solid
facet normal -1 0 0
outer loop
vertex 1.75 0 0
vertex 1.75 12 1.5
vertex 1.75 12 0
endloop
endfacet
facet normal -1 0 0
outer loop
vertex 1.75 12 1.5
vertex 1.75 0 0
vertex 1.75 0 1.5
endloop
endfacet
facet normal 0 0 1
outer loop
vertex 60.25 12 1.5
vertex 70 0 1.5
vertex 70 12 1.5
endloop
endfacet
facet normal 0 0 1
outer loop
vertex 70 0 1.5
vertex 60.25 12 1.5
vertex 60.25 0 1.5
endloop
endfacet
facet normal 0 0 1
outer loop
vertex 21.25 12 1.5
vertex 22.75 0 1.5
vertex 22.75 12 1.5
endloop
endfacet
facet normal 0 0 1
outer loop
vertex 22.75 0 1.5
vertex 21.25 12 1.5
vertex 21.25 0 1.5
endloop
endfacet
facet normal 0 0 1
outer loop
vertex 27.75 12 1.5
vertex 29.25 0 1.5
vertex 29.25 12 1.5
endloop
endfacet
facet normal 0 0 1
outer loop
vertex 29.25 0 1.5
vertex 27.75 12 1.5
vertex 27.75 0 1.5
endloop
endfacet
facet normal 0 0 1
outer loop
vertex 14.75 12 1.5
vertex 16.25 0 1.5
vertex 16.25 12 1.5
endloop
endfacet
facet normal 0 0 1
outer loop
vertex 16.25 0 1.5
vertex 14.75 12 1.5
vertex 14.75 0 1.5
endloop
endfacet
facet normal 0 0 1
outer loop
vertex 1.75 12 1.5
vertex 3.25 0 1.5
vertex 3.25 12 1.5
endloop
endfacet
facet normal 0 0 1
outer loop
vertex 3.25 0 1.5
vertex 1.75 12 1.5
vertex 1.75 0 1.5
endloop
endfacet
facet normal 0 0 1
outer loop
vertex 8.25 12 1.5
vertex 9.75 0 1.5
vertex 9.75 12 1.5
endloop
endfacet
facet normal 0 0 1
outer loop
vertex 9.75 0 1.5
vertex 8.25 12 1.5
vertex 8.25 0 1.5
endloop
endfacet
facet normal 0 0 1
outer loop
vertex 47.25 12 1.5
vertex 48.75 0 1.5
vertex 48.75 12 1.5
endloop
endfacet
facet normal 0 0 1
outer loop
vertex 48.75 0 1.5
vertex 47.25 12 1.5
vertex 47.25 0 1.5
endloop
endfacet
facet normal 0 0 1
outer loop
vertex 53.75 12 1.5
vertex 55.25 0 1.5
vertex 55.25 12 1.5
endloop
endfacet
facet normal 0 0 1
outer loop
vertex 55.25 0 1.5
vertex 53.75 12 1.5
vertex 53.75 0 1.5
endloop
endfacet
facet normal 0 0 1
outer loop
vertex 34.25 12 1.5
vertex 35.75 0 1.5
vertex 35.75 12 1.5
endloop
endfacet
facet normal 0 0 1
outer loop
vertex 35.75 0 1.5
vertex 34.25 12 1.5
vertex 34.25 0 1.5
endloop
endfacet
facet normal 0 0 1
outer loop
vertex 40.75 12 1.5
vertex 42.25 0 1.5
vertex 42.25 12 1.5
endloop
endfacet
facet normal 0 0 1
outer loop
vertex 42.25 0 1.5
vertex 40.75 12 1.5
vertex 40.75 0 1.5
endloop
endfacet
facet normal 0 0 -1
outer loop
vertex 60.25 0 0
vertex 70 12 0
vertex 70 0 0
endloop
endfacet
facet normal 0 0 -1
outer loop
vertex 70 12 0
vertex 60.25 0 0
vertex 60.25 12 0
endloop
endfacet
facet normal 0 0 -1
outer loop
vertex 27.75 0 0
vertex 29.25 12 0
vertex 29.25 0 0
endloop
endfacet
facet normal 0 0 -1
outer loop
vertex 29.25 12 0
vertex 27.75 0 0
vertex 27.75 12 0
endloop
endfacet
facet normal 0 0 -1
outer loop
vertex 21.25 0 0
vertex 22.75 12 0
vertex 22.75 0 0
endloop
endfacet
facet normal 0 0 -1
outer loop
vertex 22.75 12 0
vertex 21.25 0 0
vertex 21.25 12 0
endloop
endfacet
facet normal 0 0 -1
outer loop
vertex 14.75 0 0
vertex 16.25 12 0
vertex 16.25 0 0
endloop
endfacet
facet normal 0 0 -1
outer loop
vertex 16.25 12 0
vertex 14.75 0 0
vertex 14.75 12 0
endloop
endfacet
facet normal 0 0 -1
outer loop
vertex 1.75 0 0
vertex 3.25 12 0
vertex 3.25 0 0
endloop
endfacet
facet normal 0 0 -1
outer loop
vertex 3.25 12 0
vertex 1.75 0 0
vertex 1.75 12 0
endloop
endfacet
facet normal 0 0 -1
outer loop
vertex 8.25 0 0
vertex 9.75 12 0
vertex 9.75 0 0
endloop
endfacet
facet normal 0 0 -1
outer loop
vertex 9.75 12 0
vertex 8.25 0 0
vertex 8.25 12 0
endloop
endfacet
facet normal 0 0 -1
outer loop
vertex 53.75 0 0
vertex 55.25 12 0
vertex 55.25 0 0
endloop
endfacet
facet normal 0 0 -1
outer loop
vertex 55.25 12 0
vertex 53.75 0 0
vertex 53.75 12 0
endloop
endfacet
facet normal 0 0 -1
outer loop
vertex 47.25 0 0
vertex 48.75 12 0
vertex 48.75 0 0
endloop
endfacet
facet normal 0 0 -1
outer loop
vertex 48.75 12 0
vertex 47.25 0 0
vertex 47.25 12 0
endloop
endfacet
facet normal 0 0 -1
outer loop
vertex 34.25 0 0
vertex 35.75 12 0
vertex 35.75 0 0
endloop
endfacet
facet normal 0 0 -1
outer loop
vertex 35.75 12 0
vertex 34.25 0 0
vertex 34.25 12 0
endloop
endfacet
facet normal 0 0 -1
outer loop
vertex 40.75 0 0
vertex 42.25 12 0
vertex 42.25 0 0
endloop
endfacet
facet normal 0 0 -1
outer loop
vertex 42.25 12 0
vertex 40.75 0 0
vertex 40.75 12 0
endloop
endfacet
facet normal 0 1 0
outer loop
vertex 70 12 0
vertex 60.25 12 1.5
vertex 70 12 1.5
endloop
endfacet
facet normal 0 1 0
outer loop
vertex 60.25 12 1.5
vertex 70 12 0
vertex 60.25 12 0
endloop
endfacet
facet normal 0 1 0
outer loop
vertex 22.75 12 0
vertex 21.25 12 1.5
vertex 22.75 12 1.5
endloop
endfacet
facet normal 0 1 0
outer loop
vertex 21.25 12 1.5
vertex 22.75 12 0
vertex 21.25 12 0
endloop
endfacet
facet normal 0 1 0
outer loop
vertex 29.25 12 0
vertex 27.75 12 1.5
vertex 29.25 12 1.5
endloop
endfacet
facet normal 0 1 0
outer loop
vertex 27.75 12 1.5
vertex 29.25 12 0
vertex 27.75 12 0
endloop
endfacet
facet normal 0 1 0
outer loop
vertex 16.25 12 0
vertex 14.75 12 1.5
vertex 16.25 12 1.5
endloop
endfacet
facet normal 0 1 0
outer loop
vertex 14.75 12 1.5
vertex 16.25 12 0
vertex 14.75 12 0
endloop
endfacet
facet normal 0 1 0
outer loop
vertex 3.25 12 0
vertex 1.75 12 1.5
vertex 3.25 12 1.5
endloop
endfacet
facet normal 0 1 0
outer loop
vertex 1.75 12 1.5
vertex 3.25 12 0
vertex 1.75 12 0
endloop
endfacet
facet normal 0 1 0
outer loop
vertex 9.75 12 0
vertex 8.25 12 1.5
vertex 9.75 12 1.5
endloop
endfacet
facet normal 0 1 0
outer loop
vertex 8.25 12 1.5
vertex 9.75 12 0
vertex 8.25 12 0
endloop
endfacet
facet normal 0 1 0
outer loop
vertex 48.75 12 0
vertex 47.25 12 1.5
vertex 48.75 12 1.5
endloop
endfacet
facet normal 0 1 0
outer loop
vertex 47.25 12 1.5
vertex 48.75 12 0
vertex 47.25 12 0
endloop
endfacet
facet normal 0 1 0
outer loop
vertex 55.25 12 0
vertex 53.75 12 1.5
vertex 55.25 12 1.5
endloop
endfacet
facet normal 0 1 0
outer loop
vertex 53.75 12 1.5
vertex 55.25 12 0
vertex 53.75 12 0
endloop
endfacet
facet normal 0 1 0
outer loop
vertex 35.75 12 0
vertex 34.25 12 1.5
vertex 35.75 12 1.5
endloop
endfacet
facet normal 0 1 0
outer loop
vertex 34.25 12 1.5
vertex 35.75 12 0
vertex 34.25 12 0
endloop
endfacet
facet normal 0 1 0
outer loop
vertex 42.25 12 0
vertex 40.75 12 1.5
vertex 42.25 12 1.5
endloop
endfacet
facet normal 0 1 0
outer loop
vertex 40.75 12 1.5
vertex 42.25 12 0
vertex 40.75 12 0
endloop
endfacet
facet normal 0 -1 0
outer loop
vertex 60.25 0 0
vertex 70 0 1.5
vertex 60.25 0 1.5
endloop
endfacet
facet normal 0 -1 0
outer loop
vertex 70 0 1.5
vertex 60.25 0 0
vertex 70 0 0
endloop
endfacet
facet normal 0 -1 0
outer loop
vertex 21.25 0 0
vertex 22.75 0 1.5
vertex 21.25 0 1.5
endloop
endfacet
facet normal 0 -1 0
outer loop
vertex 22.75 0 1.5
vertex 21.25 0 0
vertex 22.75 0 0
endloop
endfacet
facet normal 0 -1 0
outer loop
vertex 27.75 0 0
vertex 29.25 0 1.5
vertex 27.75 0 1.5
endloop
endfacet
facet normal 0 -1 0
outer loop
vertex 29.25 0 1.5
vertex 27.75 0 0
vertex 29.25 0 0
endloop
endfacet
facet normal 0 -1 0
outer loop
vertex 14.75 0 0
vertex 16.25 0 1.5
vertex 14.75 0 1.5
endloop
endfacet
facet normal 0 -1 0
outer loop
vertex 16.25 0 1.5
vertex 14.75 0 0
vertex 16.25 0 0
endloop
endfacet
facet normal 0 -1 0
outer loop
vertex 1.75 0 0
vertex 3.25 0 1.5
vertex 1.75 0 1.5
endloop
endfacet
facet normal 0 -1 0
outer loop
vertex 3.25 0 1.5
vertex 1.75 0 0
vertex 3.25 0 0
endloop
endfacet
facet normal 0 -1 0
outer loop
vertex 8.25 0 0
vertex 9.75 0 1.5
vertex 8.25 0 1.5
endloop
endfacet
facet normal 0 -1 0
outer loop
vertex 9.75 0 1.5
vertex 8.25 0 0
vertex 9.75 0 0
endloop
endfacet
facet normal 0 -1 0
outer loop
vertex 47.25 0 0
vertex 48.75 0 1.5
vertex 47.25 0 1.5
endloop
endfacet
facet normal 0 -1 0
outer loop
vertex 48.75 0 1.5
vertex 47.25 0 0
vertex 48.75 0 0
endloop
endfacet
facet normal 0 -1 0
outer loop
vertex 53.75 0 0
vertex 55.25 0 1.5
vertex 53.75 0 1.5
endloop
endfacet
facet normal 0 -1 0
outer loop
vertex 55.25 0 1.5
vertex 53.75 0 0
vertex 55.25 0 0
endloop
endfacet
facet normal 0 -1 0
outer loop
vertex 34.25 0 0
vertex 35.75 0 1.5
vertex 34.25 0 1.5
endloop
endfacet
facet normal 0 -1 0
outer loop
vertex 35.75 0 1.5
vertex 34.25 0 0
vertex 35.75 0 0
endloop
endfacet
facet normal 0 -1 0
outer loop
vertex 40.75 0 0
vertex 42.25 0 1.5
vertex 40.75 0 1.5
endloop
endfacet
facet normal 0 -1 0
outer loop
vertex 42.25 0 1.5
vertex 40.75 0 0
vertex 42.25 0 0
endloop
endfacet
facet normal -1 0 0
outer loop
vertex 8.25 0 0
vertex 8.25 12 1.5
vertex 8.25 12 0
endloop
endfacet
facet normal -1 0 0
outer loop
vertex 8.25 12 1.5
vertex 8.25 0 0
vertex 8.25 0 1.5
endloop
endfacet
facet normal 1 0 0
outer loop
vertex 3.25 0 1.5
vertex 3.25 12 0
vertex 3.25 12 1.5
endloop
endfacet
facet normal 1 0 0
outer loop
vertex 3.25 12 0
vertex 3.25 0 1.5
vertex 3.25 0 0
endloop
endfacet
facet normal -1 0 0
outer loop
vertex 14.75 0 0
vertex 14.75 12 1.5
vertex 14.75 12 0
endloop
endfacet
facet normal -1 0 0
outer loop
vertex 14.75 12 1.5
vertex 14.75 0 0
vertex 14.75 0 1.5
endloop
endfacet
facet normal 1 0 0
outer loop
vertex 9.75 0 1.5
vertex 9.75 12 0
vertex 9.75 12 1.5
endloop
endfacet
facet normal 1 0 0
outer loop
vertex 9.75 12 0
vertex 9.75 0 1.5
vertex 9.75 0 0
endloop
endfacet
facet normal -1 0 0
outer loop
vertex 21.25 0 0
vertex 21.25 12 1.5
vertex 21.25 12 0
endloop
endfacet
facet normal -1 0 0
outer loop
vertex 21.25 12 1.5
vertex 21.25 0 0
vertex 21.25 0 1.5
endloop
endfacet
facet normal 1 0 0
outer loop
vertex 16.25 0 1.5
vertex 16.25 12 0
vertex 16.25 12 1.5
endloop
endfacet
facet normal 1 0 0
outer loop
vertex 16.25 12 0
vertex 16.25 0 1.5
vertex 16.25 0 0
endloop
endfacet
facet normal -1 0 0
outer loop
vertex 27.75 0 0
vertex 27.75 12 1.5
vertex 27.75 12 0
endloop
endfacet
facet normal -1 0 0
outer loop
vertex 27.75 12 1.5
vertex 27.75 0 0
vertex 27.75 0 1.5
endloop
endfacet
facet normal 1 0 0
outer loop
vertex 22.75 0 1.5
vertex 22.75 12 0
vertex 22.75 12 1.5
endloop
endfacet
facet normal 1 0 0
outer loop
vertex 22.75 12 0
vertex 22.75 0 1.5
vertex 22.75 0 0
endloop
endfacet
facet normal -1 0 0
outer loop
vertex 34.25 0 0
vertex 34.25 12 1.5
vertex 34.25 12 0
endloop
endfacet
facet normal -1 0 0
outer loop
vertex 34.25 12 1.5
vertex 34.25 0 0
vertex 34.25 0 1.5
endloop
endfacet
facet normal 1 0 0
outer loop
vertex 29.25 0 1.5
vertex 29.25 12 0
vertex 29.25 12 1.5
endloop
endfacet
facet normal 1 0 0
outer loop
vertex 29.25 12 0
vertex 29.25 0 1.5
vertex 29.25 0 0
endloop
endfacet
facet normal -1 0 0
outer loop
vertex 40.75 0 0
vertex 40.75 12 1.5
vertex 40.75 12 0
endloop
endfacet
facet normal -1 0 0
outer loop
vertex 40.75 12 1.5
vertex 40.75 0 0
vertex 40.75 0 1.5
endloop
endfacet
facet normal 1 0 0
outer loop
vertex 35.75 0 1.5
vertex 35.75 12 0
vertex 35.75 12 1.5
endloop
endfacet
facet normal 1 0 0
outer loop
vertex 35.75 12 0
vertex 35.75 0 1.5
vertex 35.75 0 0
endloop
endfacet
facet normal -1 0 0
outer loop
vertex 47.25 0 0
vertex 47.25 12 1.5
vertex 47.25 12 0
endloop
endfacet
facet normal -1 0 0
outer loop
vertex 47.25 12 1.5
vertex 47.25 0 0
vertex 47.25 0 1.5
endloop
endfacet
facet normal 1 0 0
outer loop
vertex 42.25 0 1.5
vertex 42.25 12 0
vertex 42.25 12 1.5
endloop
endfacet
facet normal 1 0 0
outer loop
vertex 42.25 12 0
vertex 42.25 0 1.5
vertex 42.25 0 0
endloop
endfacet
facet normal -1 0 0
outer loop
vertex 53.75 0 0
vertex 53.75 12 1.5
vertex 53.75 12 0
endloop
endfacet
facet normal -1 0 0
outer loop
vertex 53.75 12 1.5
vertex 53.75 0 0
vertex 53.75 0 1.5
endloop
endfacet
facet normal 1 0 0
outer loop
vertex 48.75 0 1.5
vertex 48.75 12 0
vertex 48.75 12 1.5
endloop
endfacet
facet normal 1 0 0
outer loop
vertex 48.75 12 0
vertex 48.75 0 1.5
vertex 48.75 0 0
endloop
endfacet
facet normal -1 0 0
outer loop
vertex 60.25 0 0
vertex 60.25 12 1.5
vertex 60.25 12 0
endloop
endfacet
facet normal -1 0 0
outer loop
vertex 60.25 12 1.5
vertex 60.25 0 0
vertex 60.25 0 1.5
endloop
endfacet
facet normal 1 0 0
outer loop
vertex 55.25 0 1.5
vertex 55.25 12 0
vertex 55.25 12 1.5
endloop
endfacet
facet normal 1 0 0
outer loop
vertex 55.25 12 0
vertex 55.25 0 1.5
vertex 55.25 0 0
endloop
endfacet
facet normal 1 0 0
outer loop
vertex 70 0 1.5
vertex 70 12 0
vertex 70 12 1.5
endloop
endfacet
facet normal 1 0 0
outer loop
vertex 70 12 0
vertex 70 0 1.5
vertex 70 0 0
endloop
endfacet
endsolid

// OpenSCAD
// 10-well comb for casting agarose gels, printed lying flat
// Units: mm

$fn = 64;

// --- Plate ---
plate_len   = 70;   // spine length (X)
plate_wid   = 12;   // spine width (Y)
plate_thk   = 1.5;  // plate thickness (Z)

// --- Teeth ---
teeth_n     = 10;   // number of teeth
teeth_w     = 5.0;  // tooth width (X)
teeth_l     = 12;   // tooth length (Y)
teeth_gap   = 1.5;  // gap between teeth (X)
teeth_dir   = -1;   // hang direction along Y (+1 or -1)

// --- Derived ---
row_w      = (teeth_n - 1) * teeth_gap + teeth_n * teeth_w;  // row width in X
overhang   = teeth_l - plate_wid;                            // tooth overhangs end of spine
x0         = -plate_len / 2 + row_w / 2;                     // first tooth X (centred row)

difference() {
    // Plate (spine)
    translate([0, 0, 0])
        cube([plate_len, plate_wid, plate_thk]);

    // Teeth, cut into the plate
    for (i = [0 : teeth_n - 1]) {
        translate([x0 + i * (teeth_w + teeth_gap), 0, 0])
            cube([teeth_w, teeth_l, plate_thk]);
    }
}
